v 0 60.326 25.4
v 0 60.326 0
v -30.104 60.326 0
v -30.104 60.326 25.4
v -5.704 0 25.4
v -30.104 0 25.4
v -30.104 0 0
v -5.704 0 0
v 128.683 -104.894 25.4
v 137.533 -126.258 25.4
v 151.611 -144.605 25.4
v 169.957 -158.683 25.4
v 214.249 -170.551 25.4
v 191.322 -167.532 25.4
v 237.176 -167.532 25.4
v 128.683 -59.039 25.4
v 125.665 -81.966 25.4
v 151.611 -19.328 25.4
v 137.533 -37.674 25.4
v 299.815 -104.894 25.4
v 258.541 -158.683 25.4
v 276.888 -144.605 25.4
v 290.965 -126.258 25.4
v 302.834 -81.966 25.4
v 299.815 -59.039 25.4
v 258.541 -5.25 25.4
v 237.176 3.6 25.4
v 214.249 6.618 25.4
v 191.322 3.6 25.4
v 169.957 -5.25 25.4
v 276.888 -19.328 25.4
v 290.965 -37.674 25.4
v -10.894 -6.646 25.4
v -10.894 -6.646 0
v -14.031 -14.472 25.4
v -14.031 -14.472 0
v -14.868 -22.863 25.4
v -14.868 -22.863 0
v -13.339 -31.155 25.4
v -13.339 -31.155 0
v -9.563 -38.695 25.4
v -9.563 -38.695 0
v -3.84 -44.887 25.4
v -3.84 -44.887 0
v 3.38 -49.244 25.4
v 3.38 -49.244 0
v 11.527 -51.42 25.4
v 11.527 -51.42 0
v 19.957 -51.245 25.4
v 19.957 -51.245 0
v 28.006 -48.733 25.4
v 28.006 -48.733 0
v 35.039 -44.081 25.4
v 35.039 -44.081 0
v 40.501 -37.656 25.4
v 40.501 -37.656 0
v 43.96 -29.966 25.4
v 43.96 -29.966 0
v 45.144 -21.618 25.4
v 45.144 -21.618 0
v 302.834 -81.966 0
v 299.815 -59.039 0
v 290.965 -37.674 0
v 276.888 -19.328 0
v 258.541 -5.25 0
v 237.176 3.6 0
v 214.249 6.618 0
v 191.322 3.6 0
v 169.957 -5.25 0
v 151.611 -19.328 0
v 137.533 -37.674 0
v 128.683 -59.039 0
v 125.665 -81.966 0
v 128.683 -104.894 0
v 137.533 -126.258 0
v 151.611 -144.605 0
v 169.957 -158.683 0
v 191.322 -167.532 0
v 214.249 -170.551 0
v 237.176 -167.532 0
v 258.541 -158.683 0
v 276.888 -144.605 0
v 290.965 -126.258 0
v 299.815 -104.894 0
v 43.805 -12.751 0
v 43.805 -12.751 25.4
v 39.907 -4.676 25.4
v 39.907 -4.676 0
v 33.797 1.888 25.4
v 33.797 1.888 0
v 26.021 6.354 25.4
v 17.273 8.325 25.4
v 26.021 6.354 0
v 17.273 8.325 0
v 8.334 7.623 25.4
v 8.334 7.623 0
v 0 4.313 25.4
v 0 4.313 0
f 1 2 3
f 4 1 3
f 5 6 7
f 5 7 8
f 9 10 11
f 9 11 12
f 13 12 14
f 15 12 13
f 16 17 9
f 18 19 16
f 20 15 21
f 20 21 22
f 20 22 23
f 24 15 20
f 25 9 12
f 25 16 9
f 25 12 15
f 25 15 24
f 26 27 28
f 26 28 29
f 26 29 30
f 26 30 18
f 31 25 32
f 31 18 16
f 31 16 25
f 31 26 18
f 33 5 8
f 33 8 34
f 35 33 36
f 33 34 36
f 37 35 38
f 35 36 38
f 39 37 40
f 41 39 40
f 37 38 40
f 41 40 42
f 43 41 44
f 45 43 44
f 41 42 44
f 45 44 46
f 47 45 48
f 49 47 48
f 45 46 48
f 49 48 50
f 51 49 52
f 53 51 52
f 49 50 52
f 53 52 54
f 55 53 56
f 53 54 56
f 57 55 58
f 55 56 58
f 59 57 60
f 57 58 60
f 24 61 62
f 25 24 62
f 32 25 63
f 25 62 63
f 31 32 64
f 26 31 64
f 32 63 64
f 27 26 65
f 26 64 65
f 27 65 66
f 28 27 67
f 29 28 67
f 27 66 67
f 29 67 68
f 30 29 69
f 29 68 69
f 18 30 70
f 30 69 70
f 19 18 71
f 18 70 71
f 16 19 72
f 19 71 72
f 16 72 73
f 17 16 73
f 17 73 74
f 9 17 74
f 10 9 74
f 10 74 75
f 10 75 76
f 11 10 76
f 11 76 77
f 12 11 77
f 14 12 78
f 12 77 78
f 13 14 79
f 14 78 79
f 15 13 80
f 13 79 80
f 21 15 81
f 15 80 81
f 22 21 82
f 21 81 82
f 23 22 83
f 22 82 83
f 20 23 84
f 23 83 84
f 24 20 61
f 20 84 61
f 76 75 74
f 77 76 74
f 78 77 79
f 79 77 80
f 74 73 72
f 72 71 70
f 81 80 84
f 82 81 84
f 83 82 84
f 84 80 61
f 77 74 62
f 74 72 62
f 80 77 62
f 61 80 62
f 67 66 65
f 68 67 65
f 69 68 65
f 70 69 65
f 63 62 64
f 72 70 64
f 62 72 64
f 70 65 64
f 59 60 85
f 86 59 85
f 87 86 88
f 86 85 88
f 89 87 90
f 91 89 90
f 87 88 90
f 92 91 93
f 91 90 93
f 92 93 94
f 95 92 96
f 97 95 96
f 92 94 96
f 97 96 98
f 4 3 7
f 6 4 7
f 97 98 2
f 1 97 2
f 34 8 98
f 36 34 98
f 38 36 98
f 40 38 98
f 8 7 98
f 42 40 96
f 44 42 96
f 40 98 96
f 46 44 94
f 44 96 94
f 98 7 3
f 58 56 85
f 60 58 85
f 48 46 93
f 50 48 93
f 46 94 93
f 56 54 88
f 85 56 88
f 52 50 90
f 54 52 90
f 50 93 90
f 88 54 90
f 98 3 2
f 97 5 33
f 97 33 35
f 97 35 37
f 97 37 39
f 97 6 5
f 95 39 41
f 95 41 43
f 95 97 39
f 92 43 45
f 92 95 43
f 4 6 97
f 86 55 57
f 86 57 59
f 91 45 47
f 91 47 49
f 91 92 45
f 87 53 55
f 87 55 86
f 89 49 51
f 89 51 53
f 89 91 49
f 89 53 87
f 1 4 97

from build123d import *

# Parameters (mm, degrees)
F1_DEPTH = 25.4
F0_R     = 88.5843278601


# Not quite as in the source:
# - a feature names something its author has since deleted; it is built from what else it names


with BuildPart() as f1:
    # F0 (on Top) → F1 (new body)
    with BuildSketch(Plane.XY):
        with BuildLine():
            Line((0, 4.3127644618), (0, 0))
            Line((0, 0), (-5.7035000727, 0))
            ThreePointArc((-5.7035000727, 0), (3.3801290873, -49.2437491092), (45.144380568, -21.6175578535))
            ThreePointArc((45.144380568, -21.6175578535), (30.0768795363, 4.4131774043), (0, 4.3127644618))
        make_face()
        with BuildLine():
            Line((-5.7035000727, 0), (0, 0))
            Line((0, 0), (0, 4.3127644618))
            ThreePointArc((0, 4.3127644618), (-2.9806201388, 2.3268090291), (-5.7035000727, 0))
        make_face()
        with BuildLine():
            Line((-30.1035773009, 0), (-5.7035000727, 0))
            ThreePointArc((-5.7035000727, 0), (-2.9806201388, 2.3268090291), (0, 4.3127644618))
            Line((0, 4.3127644618), (0, 60.3264644742))
            Line((0, 60.3264644742), (-30.1035773009, 60.3264644742))
            Line((-30.1035773009, 60.3264644742), (-30.1035773009, 0))
        make_face()
    extrude(amount=F1_DEPTH)


with BuildPart() as f1b:
    # F0 (on Top) → F1, piece 2 (new body)
    with BuildSketch(Plane.XY):
        with Locations((214.2491787672, -81.9662287831)):
            Circle(F0_R)
    extrude(amount=F1_DEPTH)


solid = Compound([f1.part, f1b.part])
